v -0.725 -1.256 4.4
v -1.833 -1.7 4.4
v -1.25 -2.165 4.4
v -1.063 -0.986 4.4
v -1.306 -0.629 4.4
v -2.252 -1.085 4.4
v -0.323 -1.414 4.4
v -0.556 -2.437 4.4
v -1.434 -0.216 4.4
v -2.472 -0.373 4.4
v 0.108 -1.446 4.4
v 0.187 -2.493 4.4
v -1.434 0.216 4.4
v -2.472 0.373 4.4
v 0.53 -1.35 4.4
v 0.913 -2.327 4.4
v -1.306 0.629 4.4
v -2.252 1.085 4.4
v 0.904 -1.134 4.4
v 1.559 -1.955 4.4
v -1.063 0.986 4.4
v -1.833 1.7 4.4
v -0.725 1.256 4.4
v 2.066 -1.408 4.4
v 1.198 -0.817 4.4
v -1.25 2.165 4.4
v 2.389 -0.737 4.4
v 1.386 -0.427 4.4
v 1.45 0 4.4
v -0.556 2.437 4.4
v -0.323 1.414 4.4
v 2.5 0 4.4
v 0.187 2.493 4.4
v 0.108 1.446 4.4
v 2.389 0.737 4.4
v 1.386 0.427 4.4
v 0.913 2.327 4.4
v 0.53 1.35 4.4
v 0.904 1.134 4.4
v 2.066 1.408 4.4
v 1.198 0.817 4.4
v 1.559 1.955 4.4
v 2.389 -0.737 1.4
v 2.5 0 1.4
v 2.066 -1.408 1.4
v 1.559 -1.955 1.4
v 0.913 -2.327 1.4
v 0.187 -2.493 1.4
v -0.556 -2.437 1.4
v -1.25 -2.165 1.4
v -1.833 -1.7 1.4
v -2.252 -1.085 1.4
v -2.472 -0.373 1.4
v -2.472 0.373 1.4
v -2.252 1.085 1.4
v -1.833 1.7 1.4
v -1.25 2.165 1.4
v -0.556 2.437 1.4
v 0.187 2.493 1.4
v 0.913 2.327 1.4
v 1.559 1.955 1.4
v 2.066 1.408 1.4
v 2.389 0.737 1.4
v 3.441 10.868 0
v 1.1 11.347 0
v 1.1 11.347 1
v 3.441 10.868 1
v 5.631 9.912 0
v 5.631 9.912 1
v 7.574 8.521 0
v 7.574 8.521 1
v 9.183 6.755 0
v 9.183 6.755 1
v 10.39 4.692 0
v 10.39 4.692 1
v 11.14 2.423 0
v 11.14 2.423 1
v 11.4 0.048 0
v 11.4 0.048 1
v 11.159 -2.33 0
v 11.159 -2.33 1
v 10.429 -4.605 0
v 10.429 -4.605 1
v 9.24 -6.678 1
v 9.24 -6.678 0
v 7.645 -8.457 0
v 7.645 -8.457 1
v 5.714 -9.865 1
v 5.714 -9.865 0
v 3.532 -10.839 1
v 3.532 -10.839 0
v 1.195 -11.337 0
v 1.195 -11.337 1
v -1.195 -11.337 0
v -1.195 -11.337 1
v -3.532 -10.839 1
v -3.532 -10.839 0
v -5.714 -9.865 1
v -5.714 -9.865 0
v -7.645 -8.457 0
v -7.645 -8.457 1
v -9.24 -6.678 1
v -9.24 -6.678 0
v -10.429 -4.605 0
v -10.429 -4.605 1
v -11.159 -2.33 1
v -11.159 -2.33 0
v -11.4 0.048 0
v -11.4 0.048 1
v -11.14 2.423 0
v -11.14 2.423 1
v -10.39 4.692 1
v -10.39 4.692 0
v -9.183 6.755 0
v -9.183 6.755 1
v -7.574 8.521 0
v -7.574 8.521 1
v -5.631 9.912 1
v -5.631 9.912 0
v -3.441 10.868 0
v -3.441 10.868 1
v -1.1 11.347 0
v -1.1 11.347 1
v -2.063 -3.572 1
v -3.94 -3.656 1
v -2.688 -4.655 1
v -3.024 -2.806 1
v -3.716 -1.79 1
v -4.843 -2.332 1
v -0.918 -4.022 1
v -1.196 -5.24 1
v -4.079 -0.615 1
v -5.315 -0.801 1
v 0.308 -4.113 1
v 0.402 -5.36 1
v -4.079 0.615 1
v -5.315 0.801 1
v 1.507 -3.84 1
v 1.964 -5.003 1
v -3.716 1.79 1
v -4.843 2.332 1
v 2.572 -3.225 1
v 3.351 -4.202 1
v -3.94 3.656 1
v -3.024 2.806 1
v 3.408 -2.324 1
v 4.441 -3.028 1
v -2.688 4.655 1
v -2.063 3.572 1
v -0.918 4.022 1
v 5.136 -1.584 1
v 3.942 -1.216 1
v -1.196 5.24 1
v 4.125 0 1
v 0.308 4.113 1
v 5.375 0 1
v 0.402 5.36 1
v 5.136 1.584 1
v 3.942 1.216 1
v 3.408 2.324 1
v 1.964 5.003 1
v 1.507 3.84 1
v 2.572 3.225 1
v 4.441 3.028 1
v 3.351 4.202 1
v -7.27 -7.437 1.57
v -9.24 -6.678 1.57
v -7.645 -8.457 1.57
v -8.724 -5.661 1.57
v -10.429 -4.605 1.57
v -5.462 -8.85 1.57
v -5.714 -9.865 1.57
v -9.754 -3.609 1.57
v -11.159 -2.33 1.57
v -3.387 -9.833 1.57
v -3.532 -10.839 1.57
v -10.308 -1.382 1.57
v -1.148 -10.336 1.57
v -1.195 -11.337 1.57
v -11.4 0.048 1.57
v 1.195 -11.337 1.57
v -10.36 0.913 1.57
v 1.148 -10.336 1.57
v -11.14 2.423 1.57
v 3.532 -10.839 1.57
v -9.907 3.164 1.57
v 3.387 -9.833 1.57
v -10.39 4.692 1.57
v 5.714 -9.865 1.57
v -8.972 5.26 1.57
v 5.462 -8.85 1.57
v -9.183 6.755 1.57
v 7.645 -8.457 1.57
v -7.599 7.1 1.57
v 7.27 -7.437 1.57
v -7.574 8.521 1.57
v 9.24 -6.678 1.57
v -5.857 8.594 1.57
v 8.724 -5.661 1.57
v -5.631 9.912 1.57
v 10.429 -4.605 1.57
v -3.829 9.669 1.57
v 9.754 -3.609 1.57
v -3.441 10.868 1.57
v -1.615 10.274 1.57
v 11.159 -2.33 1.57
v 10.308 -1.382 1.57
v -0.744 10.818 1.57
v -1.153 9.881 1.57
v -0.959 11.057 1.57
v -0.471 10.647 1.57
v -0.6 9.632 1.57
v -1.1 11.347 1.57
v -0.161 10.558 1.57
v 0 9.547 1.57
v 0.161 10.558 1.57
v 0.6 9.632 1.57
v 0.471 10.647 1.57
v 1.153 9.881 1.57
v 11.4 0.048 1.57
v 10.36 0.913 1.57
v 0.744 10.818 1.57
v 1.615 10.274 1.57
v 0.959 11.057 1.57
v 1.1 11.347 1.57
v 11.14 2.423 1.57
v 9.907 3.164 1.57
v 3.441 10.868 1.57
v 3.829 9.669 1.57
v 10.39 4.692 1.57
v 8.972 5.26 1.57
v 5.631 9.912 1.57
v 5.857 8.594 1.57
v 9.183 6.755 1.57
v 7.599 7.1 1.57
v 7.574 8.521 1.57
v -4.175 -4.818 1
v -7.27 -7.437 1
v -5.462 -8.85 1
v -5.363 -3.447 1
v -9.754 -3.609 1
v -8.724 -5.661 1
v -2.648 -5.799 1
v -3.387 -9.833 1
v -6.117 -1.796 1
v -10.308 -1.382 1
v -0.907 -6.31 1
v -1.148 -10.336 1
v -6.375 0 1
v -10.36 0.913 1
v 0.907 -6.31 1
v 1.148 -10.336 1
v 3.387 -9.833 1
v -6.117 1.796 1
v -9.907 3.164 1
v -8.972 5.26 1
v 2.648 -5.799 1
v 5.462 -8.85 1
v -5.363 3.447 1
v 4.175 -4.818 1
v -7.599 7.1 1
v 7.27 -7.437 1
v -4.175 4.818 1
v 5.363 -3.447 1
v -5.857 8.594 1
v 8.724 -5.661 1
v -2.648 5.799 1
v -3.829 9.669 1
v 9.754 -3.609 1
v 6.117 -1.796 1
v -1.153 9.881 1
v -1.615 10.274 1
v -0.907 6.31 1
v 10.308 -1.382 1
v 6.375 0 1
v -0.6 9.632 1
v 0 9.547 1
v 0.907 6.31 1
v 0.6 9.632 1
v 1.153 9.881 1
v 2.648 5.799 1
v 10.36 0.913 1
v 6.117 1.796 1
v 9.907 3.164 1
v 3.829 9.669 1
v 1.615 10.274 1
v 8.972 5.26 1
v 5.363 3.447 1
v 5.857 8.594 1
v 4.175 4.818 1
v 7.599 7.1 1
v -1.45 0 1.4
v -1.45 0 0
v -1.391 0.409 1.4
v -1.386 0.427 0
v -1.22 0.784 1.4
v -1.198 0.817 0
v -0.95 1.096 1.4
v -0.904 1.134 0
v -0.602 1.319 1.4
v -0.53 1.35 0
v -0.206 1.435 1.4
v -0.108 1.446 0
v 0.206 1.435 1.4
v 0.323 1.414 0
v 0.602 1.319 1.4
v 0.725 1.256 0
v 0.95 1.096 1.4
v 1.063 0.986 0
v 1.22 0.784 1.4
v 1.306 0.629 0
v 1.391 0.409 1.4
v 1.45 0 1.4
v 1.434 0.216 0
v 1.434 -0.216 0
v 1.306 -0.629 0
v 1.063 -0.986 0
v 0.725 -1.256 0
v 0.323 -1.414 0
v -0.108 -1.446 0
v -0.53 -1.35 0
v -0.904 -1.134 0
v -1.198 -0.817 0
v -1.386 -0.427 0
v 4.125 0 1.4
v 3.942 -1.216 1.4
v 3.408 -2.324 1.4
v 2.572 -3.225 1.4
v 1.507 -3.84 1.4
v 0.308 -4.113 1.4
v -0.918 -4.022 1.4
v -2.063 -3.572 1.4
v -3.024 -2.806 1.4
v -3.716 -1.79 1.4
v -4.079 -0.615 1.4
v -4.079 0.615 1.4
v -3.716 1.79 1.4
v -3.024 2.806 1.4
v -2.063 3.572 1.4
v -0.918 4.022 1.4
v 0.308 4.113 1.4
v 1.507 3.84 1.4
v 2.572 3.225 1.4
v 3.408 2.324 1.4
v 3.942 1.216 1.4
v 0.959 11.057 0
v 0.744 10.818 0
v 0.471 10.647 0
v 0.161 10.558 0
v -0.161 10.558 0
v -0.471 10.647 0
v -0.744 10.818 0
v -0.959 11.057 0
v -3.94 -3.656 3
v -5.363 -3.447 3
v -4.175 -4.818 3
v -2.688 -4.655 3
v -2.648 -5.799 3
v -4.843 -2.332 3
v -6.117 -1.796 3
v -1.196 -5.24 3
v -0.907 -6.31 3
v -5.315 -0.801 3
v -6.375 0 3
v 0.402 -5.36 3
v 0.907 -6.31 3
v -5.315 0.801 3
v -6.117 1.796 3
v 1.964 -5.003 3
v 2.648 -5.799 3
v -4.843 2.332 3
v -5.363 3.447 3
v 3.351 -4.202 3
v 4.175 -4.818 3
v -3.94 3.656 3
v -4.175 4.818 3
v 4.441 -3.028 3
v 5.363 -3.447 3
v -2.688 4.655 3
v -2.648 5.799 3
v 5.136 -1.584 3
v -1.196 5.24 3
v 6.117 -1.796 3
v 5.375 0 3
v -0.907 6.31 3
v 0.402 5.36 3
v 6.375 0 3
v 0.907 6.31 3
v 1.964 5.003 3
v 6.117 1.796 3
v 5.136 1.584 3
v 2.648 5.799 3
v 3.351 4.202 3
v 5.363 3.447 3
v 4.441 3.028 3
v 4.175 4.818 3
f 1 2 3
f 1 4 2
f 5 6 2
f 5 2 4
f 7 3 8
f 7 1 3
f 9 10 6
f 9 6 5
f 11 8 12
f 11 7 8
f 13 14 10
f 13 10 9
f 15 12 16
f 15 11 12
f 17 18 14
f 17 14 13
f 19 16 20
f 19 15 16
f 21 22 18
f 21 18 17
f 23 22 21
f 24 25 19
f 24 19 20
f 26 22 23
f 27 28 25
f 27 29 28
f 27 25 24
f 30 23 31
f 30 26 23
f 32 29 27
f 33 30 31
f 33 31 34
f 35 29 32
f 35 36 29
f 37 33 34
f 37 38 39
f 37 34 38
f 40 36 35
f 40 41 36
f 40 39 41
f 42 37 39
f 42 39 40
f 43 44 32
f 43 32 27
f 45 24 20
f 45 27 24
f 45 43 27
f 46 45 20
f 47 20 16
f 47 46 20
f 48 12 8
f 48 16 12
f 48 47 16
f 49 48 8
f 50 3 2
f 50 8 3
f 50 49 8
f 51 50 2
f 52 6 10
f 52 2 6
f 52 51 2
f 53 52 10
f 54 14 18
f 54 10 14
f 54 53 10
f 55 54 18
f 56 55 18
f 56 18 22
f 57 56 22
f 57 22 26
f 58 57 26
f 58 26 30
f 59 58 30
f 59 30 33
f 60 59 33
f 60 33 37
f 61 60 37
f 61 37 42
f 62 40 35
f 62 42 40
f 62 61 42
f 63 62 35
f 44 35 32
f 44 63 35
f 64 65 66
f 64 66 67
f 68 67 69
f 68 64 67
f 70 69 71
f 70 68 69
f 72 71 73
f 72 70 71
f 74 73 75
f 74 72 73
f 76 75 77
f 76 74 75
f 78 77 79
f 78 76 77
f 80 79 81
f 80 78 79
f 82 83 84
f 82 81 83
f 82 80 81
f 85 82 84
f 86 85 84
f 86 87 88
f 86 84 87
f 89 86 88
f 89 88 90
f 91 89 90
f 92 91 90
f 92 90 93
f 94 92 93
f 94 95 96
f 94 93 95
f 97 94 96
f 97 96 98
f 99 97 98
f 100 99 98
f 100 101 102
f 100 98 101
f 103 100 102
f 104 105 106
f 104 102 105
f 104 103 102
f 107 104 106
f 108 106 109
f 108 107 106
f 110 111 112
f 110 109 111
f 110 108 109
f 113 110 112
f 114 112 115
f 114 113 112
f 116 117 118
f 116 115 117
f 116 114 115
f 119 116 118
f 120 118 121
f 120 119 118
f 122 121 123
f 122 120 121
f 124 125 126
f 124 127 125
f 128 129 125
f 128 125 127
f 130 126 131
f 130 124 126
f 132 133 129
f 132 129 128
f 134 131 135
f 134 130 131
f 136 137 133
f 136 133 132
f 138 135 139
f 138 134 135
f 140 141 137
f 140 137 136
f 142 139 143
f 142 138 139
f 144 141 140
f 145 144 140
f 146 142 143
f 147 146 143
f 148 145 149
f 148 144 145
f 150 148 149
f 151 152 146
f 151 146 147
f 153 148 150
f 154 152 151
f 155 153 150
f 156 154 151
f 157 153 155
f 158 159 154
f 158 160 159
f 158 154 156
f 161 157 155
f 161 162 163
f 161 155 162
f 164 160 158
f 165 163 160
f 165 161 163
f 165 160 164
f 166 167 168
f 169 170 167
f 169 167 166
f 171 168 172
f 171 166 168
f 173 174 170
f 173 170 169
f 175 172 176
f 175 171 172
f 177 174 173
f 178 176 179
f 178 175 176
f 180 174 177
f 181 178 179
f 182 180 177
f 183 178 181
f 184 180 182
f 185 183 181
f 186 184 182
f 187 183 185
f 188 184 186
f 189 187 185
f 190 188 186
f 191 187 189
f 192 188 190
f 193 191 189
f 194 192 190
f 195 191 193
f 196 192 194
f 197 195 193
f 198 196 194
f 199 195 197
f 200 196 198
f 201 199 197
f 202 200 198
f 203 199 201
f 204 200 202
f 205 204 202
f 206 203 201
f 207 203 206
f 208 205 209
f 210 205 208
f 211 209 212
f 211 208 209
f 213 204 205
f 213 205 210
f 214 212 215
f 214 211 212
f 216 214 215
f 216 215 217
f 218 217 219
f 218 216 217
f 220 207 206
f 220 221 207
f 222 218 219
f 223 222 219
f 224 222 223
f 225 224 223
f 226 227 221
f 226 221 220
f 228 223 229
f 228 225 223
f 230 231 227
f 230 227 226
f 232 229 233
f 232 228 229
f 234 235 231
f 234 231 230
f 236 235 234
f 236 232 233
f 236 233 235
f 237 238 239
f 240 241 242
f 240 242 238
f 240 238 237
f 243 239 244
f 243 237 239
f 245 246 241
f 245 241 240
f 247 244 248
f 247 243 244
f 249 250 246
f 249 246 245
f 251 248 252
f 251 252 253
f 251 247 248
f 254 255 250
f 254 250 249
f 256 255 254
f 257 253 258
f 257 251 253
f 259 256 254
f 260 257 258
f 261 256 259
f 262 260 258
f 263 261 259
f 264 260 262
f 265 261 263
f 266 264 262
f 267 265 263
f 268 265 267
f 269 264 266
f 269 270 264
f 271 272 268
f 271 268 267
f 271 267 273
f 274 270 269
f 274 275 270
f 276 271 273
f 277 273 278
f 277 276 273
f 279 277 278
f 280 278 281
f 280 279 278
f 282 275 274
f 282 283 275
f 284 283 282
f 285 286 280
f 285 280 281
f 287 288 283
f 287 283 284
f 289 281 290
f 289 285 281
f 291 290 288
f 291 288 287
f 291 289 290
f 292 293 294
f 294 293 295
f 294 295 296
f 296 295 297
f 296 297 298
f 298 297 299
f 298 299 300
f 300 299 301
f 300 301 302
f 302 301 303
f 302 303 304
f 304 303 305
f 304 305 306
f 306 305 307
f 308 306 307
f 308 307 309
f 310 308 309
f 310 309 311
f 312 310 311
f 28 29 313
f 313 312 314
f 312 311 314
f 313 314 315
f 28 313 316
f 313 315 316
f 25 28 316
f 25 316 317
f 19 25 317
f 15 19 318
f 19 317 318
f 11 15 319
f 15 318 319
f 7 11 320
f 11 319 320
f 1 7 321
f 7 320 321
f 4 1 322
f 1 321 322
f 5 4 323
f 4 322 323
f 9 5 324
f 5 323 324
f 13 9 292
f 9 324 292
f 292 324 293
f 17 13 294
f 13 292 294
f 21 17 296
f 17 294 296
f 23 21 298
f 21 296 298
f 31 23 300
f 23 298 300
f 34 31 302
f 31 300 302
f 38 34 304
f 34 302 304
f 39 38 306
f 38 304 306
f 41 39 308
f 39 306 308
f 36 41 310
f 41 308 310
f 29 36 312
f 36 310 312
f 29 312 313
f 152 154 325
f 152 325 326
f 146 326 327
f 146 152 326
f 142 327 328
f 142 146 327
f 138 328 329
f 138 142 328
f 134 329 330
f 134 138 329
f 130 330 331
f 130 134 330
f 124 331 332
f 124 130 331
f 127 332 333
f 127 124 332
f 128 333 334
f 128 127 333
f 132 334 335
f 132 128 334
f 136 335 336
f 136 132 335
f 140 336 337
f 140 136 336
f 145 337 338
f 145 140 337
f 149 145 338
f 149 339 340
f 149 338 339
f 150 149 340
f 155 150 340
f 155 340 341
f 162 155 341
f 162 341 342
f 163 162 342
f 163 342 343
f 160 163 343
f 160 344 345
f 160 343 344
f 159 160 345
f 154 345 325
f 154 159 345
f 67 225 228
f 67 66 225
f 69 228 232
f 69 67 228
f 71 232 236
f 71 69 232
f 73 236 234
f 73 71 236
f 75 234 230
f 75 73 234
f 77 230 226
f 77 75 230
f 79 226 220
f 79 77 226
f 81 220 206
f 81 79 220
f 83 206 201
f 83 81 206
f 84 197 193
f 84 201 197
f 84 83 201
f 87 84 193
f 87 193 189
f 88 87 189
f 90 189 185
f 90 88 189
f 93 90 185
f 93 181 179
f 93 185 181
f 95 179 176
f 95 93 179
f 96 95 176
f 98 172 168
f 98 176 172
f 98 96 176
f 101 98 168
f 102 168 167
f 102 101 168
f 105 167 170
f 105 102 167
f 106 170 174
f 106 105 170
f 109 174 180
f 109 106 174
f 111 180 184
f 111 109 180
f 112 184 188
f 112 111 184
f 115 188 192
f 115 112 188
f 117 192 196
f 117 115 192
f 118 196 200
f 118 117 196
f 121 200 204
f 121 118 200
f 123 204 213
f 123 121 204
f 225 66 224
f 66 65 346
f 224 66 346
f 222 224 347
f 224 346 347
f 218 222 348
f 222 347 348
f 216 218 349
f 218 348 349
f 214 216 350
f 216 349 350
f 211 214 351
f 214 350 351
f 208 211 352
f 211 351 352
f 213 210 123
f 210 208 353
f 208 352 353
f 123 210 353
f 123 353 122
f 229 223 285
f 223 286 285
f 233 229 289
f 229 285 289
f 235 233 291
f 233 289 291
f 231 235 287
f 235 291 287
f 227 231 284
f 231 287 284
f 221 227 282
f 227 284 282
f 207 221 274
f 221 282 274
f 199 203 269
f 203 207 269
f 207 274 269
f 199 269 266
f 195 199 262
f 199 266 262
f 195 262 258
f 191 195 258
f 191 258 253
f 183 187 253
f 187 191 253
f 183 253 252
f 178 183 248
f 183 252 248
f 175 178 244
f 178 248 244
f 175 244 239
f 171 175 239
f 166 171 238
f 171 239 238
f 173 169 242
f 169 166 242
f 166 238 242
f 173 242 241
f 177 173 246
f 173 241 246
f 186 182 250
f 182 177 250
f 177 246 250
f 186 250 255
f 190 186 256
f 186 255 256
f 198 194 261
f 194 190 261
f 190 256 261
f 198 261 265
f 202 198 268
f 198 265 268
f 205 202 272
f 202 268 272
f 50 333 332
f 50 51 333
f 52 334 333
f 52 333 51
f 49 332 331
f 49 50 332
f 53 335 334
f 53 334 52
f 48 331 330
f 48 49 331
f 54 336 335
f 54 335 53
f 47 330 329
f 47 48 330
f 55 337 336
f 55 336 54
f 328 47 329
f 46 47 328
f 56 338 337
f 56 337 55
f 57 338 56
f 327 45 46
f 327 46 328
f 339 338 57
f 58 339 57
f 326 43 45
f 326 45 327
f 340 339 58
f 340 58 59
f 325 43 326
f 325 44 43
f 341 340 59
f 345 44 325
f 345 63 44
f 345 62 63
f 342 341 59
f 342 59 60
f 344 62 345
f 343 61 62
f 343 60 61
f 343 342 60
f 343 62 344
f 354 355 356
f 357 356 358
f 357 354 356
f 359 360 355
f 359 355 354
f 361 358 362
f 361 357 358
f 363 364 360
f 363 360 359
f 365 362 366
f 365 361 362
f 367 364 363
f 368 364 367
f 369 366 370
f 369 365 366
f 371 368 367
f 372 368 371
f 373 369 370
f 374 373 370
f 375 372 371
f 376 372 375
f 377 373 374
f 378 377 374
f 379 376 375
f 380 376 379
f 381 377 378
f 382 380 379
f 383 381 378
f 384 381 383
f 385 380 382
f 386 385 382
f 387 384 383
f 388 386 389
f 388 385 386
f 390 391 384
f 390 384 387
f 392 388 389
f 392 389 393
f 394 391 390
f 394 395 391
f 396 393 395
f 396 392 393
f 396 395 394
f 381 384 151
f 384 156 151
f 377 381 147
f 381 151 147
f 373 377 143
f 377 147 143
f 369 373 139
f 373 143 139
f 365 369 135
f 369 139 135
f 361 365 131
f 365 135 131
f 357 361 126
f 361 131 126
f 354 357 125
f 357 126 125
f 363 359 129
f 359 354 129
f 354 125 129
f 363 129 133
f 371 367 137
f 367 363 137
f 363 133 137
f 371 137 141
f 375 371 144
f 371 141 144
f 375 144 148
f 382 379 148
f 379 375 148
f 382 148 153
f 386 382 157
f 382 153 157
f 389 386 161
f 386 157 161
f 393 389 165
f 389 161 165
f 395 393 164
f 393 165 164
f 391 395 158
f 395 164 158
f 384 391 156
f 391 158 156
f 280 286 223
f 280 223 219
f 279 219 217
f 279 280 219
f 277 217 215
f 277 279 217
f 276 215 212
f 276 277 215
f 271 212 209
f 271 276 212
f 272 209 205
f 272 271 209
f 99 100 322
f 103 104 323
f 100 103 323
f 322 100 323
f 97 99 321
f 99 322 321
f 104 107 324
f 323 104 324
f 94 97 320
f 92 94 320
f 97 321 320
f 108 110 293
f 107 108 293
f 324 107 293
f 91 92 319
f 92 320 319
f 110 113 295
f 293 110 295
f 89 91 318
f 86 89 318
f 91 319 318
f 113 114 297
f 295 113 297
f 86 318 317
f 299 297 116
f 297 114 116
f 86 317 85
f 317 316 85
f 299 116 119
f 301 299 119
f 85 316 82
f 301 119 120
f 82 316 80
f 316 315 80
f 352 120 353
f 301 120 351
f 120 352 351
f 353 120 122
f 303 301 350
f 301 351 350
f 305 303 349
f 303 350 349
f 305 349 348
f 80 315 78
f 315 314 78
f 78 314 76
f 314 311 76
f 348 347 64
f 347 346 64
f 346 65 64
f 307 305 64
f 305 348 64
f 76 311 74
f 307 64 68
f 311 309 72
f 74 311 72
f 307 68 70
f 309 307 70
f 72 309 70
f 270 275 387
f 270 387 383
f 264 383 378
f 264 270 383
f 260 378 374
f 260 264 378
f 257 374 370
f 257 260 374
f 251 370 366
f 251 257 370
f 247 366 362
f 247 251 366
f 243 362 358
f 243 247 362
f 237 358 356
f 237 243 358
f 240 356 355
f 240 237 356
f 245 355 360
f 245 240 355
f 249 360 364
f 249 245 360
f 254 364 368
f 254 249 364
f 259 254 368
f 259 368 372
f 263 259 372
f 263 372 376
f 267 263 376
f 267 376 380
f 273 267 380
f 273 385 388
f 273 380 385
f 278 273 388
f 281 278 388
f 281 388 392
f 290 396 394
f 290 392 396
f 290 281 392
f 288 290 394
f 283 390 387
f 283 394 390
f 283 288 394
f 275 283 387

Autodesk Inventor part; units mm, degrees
ref_plane "YZ Plane" through (0, 0, 0) normal (1, 0, 0) x (0, 1, 0)
sketch "Sketch1" plane through (0, 0, 0) normal (0, 0, 1) x (1, 0, 0)
  circle A0 centre (0, 0) radius 11.4
  dimension "d0" = 22.8
extrude "Extrusion1" add sketch "Sketch1" along normal blind 1
ref_plane "Work Plane1" through (0, 0, 1) normal (0, 0, 1) x (1, 0, 0)
sketch "Sketch3" plane through (0, 0, 1) normal (0, 0, 1) x (1, 0, 0)
  circle A0 centre (0, 0) radius 6.375
  circle A1 centre (0, 0) radius 5.375
  dimension "d6" = 12.75
  dimension "d7" = 10.75
extrude "Extrusion3" add sketch "Sketch3" along normal blind 2
ref_plane "Work Plane2" through (0, 0, 1) normal (0, 0, 1) x (1, 0, 0)
sketch "Sketch5" plane through (0, 0, 1) normal (0, 0, 1) x (1, 0, 0)
  circle A0 centre (0, 0) radius 4.125
  dimension "d14" = 8.25
extrude "Extrusion5" add sketch "Sketch5" along normal blind 0.4
sketch "Sketch6" plane through (0, 0, 0) normal (0, 0, -1) x (-1, 0, 0)
  circle A0 centre (0, 0) radius 1.45
  dimension "d17" = 2.9
extrude "Extrusion6" cut sketch "Sketch6" against normal up to surface (1.4 mm away)
sketch "Sketch7" plane through (0, 0, 1.4) normal (0, 0, 1) x (1, 0, 0)
  circle A0 centre (0, 0) radius 1.45 projected
  circle A1 centre (0, 0) radius 1.45 projected
  circle A2 centre (0, 0) radius 2.5
  dimension "d20" = 5
extrude "Pressguide" add sketch "Sketch7" along normal blind 3
sketch "Sketch8" plane through (0, 0, 1) normal (0, 0, 1) x (1, 0, 0)
  circle A0 centre (0, 0) radius 11.4 projected
  line L0 (-1.1, 11.3468) -> (1.1, 11.3468) construction
  line L1 (0, 11.3468) -> (0, 10.5468) construction
  arc A1 (-1.1, 11.3468) -> (1.1, 11.3468) centre (0, 11.7031) ccw
  dimension "d23" = 2.2
  dimension "d24" = 0.8
extrude "Extrusion8" cut sketch "Sketch8" against normal up to surface (1 mm away) contours A1 A0 picked at (-0.044, 11.1142)
sketch "Sketch9" plane through (0, 0, 1) normal (0, 0, 1) x (1, 0, 0)
  arc A0 (-1.1, 11.3468) -> (1.1, 11.3468) centre (0, 0) ccw projected
  arc A1 (-1.1, 11.3468) -> (1.1, 11.3468) centre (0, 11.7031) ccw projected
  arc A2 (-1.6146, 10.2739) -> (1.6146, 10.2739) centre (0, 0) ccw
  arc A3 (-1.6146, 10.2739) -> (1.6146, 10.2739) centre (0, 11.7031) ccw
  dimension "d27" = 1
extrude "Extrusion9" add sketch "Sketch9" along normal blind 0.57
sketch "Sketch10" plane through (0, 0, 0) normal (0, 0, -1) x (-1, 0, 0)
  circle A0 centre (0, 0) radius 1.45 projected
extrude "Axle" [suppressed]
properties part number "PMSealNoAxle"
